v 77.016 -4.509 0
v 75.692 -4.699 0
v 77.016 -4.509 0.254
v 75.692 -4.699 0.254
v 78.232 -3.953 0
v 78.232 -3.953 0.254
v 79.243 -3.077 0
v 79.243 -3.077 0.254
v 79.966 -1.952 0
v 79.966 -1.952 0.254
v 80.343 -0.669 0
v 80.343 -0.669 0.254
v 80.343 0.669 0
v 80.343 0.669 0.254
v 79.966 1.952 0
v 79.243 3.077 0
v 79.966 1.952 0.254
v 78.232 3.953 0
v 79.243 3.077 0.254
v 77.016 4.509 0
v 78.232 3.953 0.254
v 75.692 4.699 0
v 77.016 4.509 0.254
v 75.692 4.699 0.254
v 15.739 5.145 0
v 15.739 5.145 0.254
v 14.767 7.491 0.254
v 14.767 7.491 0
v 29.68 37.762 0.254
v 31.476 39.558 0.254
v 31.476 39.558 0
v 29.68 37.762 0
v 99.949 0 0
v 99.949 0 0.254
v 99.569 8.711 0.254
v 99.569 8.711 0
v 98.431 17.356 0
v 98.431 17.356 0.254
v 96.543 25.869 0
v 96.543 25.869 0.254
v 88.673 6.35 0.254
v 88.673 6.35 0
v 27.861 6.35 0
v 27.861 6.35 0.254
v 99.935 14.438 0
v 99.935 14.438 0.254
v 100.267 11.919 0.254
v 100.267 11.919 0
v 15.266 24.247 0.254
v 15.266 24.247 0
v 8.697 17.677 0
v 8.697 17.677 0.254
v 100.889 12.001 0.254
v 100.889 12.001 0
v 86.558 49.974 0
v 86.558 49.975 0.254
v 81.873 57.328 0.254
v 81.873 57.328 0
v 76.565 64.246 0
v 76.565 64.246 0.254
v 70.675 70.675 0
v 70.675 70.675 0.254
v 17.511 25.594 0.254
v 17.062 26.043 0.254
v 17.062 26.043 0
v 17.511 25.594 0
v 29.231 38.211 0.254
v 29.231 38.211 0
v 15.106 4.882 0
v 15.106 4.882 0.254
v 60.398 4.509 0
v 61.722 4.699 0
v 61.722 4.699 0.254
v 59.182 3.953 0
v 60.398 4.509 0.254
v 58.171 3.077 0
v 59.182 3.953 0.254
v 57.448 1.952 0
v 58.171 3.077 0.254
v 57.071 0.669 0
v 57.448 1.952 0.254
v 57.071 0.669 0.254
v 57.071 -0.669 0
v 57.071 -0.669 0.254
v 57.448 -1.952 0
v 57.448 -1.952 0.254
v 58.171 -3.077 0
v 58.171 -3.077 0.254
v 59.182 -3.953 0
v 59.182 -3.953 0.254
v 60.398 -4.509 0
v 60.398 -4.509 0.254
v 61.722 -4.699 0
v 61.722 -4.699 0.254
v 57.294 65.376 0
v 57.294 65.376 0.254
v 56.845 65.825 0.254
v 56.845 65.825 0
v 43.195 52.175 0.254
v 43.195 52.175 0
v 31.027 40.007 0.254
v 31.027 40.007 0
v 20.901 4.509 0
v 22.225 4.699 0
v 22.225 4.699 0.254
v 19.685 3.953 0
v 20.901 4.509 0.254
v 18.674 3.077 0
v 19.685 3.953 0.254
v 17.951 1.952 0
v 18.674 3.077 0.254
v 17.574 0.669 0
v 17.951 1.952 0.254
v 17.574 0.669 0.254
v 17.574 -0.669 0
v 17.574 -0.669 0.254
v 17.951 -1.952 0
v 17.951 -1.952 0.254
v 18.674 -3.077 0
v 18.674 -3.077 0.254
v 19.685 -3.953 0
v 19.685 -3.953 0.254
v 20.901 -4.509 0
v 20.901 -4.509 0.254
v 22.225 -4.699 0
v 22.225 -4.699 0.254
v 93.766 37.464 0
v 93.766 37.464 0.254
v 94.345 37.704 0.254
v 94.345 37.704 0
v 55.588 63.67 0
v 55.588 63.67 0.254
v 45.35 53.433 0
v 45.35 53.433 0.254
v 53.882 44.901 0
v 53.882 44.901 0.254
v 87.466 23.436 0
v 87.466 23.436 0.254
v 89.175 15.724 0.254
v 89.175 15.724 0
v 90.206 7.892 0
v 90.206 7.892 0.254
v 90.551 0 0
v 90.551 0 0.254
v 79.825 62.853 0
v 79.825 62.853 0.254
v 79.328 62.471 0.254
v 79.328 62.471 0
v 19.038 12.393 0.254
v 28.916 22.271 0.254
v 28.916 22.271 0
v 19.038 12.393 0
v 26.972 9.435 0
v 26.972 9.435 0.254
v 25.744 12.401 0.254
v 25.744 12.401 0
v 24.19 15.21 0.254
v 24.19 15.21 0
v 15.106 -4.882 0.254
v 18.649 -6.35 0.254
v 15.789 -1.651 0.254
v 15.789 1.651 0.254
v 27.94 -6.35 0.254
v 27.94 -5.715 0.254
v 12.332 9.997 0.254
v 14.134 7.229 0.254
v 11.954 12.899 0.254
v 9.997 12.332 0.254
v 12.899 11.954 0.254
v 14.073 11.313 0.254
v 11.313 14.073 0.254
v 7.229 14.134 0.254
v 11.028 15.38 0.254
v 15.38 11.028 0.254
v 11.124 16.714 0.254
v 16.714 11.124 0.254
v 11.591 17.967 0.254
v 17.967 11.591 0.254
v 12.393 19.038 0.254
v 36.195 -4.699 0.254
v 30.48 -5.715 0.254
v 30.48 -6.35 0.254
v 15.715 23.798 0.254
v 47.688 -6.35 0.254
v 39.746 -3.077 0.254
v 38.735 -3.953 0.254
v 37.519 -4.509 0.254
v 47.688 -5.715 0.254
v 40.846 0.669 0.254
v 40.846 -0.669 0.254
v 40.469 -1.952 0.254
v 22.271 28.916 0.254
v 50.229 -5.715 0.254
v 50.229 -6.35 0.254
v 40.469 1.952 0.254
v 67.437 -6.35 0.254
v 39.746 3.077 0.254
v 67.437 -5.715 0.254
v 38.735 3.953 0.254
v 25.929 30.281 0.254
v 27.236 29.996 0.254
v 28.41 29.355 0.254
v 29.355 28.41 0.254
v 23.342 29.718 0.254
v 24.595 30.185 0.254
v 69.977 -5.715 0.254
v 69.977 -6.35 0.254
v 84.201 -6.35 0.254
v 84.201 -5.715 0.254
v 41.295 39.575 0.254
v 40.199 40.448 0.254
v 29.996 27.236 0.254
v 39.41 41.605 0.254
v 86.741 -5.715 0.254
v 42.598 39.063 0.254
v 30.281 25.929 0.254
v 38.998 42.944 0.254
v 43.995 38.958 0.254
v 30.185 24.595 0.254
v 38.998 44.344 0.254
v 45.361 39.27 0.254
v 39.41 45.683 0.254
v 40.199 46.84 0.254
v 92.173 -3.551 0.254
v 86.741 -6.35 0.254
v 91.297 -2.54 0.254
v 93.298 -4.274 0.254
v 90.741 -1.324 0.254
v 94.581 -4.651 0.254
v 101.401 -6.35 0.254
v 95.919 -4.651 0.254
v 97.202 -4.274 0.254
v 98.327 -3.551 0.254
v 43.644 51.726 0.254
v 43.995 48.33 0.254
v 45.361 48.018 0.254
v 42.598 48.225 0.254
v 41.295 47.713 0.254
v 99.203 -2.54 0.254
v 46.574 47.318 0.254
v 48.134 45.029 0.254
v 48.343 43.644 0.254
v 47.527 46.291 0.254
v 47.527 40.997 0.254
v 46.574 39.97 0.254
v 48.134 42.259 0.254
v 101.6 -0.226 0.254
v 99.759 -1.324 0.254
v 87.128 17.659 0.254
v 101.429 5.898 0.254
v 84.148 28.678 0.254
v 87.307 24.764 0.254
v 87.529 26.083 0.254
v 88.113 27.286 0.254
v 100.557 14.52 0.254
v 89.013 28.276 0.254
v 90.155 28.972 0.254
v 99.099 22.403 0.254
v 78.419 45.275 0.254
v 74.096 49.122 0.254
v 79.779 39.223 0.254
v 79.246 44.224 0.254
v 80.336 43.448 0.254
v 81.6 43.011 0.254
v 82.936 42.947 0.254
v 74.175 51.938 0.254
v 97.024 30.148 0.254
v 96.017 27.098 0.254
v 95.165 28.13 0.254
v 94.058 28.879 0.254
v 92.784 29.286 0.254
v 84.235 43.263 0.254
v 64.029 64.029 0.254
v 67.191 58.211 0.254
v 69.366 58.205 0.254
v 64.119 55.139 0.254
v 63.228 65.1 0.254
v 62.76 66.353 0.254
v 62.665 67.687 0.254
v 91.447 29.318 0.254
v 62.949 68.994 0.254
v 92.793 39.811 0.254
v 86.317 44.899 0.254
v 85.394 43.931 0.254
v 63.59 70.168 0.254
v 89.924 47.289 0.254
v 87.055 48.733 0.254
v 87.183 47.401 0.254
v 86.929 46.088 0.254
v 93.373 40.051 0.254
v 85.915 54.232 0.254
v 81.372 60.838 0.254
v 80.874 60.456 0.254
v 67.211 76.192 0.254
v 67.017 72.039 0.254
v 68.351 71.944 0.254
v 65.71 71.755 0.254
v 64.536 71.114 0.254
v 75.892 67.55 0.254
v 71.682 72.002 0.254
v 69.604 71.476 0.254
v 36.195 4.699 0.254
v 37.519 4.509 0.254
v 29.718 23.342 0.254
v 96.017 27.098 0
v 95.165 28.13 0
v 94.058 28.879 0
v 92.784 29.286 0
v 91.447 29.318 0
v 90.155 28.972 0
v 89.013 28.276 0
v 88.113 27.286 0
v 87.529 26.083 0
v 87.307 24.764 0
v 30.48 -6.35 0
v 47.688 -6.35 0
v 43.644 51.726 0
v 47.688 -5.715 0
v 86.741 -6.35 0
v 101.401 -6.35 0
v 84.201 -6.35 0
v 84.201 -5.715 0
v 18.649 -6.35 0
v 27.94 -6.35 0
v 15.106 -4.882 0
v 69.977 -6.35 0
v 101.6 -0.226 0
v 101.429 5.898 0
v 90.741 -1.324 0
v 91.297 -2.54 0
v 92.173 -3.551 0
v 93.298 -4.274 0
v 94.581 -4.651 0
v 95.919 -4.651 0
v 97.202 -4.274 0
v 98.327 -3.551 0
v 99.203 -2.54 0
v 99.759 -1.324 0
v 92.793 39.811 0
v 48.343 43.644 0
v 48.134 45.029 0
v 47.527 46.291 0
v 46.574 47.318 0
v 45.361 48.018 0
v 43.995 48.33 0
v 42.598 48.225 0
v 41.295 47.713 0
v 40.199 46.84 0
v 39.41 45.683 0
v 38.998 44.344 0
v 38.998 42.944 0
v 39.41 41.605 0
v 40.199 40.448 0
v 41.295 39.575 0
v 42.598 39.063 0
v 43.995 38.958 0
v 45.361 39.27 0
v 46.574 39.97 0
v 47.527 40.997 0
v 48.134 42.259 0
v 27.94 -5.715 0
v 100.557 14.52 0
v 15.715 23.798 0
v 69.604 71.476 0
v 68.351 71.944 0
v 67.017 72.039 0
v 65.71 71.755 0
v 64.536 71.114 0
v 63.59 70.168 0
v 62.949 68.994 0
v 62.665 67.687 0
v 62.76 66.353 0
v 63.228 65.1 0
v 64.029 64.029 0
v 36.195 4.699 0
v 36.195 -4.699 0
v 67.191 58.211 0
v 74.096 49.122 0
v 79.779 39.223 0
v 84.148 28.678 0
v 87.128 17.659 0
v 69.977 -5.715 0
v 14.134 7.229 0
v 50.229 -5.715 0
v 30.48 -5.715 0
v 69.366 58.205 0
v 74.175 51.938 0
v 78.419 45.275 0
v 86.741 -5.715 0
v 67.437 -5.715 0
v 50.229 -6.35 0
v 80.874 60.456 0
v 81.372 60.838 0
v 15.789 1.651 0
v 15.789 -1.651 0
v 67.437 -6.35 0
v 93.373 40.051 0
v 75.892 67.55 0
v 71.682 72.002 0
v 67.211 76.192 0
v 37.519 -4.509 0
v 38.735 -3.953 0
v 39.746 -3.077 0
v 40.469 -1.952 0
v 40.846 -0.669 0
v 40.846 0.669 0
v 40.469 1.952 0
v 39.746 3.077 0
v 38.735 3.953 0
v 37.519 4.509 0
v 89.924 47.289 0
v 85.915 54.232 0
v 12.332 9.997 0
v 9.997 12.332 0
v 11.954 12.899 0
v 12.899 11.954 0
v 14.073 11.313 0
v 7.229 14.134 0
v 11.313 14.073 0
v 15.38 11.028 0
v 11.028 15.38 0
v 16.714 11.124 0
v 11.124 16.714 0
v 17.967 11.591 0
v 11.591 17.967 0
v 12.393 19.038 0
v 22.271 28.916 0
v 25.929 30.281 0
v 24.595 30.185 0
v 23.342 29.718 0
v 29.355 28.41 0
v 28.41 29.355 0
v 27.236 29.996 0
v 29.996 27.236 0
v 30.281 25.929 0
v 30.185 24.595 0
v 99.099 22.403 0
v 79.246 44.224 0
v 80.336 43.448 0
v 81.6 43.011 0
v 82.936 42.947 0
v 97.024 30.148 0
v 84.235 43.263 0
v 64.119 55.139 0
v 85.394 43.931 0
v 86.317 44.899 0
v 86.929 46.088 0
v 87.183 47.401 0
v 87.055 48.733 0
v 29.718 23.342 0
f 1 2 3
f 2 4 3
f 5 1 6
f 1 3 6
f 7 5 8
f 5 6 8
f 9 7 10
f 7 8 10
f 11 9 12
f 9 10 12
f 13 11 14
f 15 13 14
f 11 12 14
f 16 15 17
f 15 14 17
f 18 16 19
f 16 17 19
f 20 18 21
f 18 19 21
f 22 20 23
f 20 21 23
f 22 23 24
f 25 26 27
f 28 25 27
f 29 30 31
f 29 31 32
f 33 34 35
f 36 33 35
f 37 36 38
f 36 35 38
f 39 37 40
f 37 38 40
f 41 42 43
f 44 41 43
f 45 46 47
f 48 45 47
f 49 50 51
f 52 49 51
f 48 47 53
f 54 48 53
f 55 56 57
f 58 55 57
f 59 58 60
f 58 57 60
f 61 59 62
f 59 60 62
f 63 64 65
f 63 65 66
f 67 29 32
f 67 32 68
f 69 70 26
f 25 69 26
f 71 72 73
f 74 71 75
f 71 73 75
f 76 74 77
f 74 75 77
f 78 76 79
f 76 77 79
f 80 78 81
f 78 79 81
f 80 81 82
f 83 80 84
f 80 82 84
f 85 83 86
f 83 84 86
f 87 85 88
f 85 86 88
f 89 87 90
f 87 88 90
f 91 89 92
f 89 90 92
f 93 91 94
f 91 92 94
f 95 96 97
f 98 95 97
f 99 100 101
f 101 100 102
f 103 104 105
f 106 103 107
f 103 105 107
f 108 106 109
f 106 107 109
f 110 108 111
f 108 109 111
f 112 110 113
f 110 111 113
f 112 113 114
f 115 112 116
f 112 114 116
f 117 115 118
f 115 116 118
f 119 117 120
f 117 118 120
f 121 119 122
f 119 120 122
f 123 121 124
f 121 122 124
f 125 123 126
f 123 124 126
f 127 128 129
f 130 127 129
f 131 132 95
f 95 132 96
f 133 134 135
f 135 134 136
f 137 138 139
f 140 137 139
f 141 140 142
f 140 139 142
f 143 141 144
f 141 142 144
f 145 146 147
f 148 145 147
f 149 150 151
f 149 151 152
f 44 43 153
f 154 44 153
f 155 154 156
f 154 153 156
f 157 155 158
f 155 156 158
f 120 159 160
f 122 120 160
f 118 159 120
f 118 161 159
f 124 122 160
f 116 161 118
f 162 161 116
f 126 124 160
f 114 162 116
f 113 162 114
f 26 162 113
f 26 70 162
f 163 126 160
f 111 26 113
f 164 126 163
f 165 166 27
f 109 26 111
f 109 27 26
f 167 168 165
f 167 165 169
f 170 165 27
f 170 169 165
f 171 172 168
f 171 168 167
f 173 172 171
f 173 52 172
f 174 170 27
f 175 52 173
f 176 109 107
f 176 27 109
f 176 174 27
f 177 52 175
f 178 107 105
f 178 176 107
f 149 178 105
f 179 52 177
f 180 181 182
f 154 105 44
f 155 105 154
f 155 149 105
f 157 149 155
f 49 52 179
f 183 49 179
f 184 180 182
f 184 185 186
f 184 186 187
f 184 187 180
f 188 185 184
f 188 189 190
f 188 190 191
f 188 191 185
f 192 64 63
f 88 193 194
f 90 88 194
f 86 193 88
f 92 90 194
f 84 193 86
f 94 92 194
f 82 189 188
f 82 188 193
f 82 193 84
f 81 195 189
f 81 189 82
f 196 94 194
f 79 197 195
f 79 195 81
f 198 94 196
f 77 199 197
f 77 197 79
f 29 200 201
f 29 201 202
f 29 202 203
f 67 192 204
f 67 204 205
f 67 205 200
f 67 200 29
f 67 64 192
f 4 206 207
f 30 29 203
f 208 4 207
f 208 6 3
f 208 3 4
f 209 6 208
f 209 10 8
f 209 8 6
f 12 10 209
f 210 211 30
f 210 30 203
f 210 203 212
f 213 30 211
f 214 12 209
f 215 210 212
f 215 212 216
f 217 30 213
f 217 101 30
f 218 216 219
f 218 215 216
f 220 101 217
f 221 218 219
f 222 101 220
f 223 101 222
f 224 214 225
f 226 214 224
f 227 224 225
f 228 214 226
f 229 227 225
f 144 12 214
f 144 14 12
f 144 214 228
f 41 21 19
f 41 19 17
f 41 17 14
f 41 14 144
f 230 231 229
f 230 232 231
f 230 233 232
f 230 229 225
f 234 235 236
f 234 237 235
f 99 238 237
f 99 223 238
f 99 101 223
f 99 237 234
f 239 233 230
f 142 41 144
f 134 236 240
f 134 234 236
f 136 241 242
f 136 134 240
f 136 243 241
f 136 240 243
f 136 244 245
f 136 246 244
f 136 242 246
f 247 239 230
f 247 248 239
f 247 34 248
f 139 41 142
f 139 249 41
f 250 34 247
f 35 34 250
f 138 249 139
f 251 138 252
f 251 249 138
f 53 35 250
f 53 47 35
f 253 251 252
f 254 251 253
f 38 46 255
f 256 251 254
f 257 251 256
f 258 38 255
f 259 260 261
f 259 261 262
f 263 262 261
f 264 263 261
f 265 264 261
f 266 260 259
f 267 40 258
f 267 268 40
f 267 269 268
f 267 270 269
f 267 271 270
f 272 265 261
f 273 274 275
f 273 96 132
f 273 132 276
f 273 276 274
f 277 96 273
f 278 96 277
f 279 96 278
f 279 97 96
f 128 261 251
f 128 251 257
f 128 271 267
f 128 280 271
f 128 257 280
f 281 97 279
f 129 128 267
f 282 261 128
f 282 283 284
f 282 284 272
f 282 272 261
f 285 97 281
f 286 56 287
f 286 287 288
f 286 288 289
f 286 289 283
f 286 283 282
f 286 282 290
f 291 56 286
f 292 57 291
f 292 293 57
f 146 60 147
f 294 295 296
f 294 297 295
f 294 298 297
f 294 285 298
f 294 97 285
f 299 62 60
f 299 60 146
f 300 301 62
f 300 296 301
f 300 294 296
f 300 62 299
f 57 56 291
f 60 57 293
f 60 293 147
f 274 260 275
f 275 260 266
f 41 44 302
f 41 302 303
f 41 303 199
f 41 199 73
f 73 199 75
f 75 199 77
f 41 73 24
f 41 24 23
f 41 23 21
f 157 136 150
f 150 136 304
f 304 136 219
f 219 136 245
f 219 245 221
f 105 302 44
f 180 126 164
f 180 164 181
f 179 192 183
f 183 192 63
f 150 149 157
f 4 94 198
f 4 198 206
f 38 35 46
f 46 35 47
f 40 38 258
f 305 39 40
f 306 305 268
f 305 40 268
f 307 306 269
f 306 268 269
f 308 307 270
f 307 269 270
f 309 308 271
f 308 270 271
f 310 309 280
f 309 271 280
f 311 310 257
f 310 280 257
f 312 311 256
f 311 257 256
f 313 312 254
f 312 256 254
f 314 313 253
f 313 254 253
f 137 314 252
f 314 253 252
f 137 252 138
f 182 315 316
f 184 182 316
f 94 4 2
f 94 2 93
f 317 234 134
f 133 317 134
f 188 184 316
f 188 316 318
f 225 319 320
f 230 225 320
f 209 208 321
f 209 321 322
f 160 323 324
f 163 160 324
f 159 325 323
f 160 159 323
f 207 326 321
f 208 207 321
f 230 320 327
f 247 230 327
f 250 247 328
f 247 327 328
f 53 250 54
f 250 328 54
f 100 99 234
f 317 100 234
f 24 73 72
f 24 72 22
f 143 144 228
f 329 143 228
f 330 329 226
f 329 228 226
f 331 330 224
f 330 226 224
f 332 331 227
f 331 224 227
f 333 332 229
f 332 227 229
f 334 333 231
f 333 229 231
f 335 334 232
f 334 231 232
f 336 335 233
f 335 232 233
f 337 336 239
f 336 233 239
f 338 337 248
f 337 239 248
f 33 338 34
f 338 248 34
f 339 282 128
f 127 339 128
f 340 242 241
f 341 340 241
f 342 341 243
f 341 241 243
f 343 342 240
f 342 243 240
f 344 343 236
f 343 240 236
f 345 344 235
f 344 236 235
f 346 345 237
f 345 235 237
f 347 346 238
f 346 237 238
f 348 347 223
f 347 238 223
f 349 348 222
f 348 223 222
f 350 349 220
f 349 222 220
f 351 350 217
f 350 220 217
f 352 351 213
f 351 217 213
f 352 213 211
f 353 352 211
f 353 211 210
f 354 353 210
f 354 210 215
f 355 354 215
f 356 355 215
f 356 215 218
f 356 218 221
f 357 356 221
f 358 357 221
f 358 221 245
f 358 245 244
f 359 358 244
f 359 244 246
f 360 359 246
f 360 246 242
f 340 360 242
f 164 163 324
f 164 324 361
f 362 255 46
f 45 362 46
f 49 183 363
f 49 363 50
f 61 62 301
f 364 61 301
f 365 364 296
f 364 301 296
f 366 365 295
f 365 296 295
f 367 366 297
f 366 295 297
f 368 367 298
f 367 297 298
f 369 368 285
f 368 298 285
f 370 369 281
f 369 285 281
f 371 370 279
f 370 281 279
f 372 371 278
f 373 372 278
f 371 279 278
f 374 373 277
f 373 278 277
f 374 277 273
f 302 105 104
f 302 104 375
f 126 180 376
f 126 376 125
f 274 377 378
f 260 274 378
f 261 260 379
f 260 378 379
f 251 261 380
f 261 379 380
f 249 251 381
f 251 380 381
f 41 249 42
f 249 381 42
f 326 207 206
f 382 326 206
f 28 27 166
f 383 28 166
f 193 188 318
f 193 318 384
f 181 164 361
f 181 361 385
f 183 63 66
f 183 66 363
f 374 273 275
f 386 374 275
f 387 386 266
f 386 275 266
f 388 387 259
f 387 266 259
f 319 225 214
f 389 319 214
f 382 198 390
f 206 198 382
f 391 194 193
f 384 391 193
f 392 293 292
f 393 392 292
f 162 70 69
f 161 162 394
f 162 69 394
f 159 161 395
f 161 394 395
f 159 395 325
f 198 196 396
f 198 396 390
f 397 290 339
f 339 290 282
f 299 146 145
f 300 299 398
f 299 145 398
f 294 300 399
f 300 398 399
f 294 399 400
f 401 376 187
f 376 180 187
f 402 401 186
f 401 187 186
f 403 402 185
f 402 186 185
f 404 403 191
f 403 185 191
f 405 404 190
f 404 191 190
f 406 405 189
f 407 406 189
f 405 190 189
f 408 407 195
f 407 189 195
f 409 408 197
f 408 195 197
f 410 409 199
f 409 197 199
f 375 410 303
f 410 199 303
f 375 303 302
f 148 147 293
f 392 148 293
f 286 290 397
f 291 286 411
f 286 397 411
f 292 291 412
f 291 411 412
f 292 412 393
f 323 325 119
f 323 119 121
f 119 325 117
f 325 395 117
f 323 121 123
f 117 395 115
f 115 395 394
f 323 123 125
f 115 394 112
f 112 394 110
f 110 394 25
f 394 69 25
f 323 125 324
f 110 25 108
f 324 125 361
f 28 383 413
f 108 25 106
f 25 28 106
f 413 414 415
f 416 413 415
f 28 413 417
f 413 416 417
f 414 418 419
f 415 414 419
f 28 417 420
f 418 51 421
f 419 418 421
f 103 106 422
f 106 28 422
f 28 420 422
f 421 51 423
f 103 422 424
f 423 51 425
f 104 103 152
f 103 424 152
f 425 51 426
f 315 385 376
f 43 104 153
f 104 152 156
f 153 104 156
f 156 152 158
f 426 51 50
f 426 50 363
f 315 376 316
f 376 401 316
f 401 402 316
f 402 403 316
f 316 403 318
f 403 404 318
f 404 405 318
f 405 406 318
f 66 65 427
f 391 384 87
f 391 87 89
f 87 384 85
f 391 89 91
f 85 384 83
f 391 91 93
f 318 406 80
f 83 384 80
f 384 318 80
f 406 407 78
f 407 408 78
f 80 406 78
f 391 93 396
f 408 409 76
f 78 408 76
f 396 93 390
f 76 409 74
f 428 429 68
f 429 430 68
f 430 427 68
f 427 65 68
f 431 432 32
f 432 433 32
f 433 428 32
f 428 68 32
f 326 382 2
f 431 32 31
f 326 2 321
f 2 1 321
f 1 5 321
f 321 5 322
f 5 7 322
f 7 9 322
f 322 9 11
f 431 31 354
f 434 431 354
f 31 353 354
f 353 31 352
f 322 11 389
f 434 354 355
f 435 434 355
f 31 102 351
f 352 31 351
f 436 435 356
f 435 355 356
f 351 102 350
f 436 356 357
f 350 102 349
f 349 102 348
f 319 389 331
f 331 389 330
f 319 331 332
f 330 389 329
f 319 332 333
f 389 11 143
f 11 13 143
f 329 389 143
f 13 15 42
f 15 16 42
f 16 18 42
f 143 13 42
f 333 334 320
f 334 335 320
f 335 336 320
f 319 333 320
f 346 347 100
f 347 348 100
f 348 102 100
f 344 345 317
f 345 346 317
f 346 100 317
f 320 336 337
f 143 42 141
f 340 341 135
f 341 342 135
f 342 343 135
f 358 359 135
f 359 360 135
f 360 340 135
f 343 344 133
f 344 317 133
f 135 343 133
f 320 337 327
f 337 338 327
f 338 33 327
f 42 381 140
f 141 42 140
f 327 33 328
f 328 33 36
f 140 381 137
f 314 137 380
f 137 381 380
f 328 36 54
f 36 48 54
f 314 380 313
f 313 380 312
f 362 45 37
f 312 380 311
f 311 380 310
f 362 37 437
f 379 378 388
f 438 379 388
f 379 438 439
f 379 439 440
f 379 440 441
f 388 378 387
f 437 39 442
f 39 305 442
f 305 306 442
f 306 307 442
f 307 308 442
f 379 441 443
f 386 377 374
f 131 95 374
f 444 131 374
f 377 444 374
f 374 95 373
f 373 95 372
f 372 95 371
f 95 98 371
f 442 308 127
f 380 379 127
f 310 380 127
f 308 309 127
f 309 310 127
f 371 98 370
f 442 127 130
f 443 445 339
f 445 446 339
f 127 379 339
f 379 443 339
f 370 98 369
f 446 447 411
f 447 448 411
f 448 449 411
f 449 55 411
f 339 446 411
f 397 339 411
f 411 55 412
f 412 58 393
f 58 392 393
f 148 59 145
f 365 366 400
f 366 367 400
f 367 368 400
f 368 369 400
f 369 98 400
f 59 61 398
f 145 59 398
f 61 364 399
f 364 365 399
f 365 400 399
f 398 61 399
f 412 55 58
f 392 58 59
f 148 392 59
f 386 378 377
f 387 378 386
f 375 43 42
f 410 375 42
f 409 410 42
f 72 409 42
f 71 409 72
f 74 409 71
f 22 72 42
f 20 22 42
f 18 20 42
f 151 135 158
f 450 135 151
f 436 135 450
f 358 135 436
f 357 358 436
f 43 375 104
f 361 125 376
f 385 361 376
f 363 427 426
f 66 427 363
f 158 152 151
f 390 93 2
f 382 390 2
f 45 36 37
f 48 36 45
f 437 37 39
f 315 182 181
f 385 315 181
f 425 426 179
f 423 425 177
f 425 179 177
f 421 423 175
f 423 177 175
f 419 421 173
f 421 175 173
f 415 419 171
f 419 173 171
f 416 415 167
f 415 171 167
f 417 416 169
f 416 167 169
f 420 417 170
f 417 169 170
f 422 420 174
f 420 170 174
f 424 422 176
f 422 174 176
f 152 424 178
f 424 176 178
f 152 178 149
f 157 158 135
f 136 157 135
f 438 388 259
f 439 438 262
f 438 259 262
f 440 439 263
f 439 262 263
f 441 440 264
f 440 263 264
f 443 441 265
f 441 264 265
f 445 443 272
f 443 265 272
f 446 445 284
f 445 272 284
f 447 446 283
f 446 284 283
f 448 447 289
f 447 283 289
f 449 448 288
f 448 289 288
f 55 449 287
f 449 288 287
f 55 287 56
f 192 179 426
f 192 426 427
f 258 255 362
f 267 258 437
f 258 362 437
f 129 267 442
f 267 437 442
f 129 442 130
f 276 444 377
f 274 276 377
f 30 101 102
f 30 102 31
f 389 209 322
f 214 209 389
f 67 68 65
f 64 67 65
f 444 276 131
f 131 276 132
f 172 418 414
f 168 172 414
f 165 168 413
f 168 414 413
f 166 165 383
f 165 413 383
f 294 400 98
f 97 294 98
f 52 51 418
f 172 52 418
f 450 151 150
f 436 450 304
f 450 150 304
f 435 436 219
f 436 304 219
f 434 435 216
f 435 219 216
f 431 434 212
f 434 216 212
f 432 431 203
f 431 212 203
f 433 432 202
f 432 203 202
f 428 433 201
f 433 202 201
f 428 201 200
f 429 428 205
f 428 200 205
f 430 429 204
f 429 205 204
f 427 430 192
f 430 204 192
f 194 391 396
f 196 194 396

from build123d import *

# Parameters (mm, degrees)
BOSS_EXTRUDE1_DEPTH = 0.254
SKETCH2_R           = 4.699
CUT_EXTRUDE1_DEPTH  = 1.254
SKETCH3_W           = 2.54
SKETCH3_H           = 0.635
CUT_EXTRUDE2_DEPTH  = 1.254
CUT_EXTRUDE4_DEPTH  = 1.254
CUT_EXTRUDE5_DEPTH  = 1.254


with BuildPart() as part:
    # Sketch1 → Boss-Extrude1 (new body)
    with BuildSketch(Plane.XY):
        with BuildLine():
            Line((67.21146711, 76.191723231), (8.696654013, 17.676910134))
            Line((8.696654013, 17.676910134), (7.228954972, 14.133571205))
            ThreePointArc((7.228954972, 14.133571205), (14.666587579, 6.075099489), (15.105587123, -4.88230096))
            Line((15.105587123, -4.88230096), (18.648926052, -6.35))
            Line((18.648926052, -6.35), (101.401368334, -6.35))
            ThreePointArc((101.401368334, -6.35), (93.866160503, 38.880636728), (67.21146711, 76.191723231))
        make_face()
        with BuildLine():
            Line((88.672924278, 6.35), (27.86051193, 6.35))
            ThreePointArc((27.86051193, 6.35), (26.399857642, 10.93517908), (24.190484974, 15.210228852))
            Line((24.190484974, 15.210228852), (67.191354125, 58.211098004))
            ThreePointArc((67.191354125, 58.211098004), (82.13289044, 34.020557137), (88.672924278, 6.35))
        make_face(mode=Mode.SUBTRACT)
    extrude(amount=BOSS_EXTRUDE1_DEPTH)

    # Sketch2 → Cut-Extrude1 (cut, through all)
    with BuildSketch(Plane.XY.offset(0.254)):
        with Locations((22.225, 0)):
            Circle(SKETCH2_R)
        with Locations((36.195, 0)):
            Circle(SKETCH2_R)
        with Locations((61.722, 0)):
            Circle(SKETCH2_R)
        with Locations((75.692, 0)):
            Circle(SKETCH2_R)
        with Locations((95.25, 0)):
            Circle(SKETCH2_R)
        with Locations((15.715448212, 15.715448212)):
            Circle(SKETCH2_R)
        with Locations((25.593729945, 25.593729945)):
            Circle(SKETCH2_R)
        with Locations((43.644044748, 43.644044748)):
            Circle(SKETCH2_R)
        with Locations((53.522326482, 53.522326482)):
            Circle(SKETCH2_R)
        with Locations((92.004434954, 24.652514046)):
            Circle(SKETCH2_R)
        with Locations((82.48891971, 47.625)):
            Circle(SKETCH2_R)
        with Locations((67.351920908, 67.351920908)):
            Circle(SKETCH2_R)
    extrude(amount=-CUT_EXTRUDE1_DEPTH, mode=Mode.SUBTRACT)

    # Sketch3 → Cut-Extrude2 (cut, through all)
    with BuildSketch(Plane.XY.offset(0.254)):
        Polygon((15.266435406, 24.246691527), (17.06248663, 26.042742751), (17.511499436, 25.593729945), (15.715448212, 23.797678721), align=None)
        Polygon((44.991083167, 53.971339288), (43.195031942, 52.175288063), (43.644044748, 51.726275257), (45.440095973, 53.522326482), align=None)
        with Locations((29.21, -6.0325)):
            Rectangle(SKETCH3_W, SKETCH3_H)
        with Locations((68.707, -6.0325)):
            Rectangle(SKETCH3_W, SKETCH3_H)
        Polygon((29.230733674, 38.210989795), (31.026784898, 40.007041019), (31.475797704, 39.558028213), (29.67974648, 37.761976989), align=None)
        Polygon((56.845021246, 65.825277367), (55.048970022, 64.029226143), (55.497982828, 63.580213337), (57.294034052, 65.376264561), align=None)
        with Locations((48.9585, -6.0325)):
            Rectangle(SKETCH3_W, SKETCH3_H)
        with Locations((85.471, -6.0325)):
            Rectangle(SKETCH3_W, SKETCH3_H)
        Polygon((99.935462164, 14.437711971), (100.266998693, 11.919442024), (101.526133667, 12.085210288), (101.194597138, 14.603480236), align=None)
        Polygon((93.765504959, 37.464305742), (94.938831965, 37.950313702), (93.966816047, 40.296967714), (92.793489041, 39.810959755), align=None)
        Polygon((79.327792988, 62.471156422), (80.874047017, 60.456038938), (81.88160576, 61.229165953), (80.33535173, 63.244283437), align=None)
        Polygon((13.593916116, 7.005422516), (14.565932035, 4.658768503), (15.739259041, 5.144776462), (14.767243123, 7.491430475), align=None)
    extrude(amount=-CUT_EXTRUDE2_DEPTH, mode=Mode.SUBTRACT)

    # Sketch6 → Cut-Extrude4 (cut, through all)
    with BuildSketch(Plane.XY.offset(0.254)):
        with BuildLine():
            Line((12.392753447, 19.038142977), (22.27103518, 28.91642471))
            ThreePointArc((22.27103518, 28.91642471), (28.91642471, 28.91642471), (28.91642471, 22.27103518))
            Line((28.91642471, 22.27103518), (19.038142977, 12.392753447))
            ThreePointArc((19.038142977, 12.392753447), (12.392753447, 12.392753447), (12.392753447, 19.038142977))
        make_face()
        with BuildLine():
            Line((22.225, 4.699), (36.195, 4.699))
            ThreePointArc((36.195, 4.699), (40.894, 0), (36.195, -4.699))
            Line((36.195, -4.699), (22.225, -4.699))
            ThreePointArc((22.225, -4.699), (17.526, 0), (22.225, 4.699))
        make_face()
        with BuildLine():
            Line((61.722, 4.699), (75.692, 4.699))
            ThreePointArc((75.692, 4.699), (80.391, 0), (75.692, -4.699))
            Line((75.692, -4.699), (61.722, -4.699))
            ThreePointArc((61.722, -4.699), (57.023, 0), (61.722, 4.699))
        make_face()
        with BuildLine():
            ThreePointArc((99.949, 0), (99.093922449, 13.045962386), (96.543320412, 25.868704739))
            ThreePointArc((96.543320412, 25.868704739), (90.788244261, 29.191399504), (87.465549496, 23.436323353))
            ThreePointArc((87.465549496, 23.436323353), (89.776323642, 11.819277232), (90.551, 0))
            ThreePointArc((90.551, 0), (95.25, -4.699), (99.949, 0))
        make_face()
        with BuildLine():
            ThreePointArc((86.558373083, 49.9745), (79.294873009, 60.845096068), (70.674615673, 70.674615673))
            ThreePointArc((70.674615673, 70.674615673), (64.029226143, 70.674615673), (64.029226143, 64.029226143))
            ThreePointArc((64.029226143, 64.029226143), (71.838938317, 55.123956158), (78.419466338, 45.2755))
            ThreePointArc((78.419466338, 45.2755), (84.83841971, 43.555546628), (86.558373083, 49.9745))
        make_face()
    extrude(amount=-CUT_EXTRUDE4_DEPTH, mode=Mode.SUBTRACT)

    # Sketch5 → Cut-Extrude5 (cut, through all)
    with BuildSketch(Plane.XY.offset(0.254)):
        Polygon((53.881536726, 44.901280605), (64.119028704, 55.138772583), (55.138772583, 64.119028704), (44.901280605, 53.881536726), align=None)
    extrude(amount=-CUT_EXTRUDE5_DEPTH, mode=Mode.SUBTRACT)


solid = part.part
